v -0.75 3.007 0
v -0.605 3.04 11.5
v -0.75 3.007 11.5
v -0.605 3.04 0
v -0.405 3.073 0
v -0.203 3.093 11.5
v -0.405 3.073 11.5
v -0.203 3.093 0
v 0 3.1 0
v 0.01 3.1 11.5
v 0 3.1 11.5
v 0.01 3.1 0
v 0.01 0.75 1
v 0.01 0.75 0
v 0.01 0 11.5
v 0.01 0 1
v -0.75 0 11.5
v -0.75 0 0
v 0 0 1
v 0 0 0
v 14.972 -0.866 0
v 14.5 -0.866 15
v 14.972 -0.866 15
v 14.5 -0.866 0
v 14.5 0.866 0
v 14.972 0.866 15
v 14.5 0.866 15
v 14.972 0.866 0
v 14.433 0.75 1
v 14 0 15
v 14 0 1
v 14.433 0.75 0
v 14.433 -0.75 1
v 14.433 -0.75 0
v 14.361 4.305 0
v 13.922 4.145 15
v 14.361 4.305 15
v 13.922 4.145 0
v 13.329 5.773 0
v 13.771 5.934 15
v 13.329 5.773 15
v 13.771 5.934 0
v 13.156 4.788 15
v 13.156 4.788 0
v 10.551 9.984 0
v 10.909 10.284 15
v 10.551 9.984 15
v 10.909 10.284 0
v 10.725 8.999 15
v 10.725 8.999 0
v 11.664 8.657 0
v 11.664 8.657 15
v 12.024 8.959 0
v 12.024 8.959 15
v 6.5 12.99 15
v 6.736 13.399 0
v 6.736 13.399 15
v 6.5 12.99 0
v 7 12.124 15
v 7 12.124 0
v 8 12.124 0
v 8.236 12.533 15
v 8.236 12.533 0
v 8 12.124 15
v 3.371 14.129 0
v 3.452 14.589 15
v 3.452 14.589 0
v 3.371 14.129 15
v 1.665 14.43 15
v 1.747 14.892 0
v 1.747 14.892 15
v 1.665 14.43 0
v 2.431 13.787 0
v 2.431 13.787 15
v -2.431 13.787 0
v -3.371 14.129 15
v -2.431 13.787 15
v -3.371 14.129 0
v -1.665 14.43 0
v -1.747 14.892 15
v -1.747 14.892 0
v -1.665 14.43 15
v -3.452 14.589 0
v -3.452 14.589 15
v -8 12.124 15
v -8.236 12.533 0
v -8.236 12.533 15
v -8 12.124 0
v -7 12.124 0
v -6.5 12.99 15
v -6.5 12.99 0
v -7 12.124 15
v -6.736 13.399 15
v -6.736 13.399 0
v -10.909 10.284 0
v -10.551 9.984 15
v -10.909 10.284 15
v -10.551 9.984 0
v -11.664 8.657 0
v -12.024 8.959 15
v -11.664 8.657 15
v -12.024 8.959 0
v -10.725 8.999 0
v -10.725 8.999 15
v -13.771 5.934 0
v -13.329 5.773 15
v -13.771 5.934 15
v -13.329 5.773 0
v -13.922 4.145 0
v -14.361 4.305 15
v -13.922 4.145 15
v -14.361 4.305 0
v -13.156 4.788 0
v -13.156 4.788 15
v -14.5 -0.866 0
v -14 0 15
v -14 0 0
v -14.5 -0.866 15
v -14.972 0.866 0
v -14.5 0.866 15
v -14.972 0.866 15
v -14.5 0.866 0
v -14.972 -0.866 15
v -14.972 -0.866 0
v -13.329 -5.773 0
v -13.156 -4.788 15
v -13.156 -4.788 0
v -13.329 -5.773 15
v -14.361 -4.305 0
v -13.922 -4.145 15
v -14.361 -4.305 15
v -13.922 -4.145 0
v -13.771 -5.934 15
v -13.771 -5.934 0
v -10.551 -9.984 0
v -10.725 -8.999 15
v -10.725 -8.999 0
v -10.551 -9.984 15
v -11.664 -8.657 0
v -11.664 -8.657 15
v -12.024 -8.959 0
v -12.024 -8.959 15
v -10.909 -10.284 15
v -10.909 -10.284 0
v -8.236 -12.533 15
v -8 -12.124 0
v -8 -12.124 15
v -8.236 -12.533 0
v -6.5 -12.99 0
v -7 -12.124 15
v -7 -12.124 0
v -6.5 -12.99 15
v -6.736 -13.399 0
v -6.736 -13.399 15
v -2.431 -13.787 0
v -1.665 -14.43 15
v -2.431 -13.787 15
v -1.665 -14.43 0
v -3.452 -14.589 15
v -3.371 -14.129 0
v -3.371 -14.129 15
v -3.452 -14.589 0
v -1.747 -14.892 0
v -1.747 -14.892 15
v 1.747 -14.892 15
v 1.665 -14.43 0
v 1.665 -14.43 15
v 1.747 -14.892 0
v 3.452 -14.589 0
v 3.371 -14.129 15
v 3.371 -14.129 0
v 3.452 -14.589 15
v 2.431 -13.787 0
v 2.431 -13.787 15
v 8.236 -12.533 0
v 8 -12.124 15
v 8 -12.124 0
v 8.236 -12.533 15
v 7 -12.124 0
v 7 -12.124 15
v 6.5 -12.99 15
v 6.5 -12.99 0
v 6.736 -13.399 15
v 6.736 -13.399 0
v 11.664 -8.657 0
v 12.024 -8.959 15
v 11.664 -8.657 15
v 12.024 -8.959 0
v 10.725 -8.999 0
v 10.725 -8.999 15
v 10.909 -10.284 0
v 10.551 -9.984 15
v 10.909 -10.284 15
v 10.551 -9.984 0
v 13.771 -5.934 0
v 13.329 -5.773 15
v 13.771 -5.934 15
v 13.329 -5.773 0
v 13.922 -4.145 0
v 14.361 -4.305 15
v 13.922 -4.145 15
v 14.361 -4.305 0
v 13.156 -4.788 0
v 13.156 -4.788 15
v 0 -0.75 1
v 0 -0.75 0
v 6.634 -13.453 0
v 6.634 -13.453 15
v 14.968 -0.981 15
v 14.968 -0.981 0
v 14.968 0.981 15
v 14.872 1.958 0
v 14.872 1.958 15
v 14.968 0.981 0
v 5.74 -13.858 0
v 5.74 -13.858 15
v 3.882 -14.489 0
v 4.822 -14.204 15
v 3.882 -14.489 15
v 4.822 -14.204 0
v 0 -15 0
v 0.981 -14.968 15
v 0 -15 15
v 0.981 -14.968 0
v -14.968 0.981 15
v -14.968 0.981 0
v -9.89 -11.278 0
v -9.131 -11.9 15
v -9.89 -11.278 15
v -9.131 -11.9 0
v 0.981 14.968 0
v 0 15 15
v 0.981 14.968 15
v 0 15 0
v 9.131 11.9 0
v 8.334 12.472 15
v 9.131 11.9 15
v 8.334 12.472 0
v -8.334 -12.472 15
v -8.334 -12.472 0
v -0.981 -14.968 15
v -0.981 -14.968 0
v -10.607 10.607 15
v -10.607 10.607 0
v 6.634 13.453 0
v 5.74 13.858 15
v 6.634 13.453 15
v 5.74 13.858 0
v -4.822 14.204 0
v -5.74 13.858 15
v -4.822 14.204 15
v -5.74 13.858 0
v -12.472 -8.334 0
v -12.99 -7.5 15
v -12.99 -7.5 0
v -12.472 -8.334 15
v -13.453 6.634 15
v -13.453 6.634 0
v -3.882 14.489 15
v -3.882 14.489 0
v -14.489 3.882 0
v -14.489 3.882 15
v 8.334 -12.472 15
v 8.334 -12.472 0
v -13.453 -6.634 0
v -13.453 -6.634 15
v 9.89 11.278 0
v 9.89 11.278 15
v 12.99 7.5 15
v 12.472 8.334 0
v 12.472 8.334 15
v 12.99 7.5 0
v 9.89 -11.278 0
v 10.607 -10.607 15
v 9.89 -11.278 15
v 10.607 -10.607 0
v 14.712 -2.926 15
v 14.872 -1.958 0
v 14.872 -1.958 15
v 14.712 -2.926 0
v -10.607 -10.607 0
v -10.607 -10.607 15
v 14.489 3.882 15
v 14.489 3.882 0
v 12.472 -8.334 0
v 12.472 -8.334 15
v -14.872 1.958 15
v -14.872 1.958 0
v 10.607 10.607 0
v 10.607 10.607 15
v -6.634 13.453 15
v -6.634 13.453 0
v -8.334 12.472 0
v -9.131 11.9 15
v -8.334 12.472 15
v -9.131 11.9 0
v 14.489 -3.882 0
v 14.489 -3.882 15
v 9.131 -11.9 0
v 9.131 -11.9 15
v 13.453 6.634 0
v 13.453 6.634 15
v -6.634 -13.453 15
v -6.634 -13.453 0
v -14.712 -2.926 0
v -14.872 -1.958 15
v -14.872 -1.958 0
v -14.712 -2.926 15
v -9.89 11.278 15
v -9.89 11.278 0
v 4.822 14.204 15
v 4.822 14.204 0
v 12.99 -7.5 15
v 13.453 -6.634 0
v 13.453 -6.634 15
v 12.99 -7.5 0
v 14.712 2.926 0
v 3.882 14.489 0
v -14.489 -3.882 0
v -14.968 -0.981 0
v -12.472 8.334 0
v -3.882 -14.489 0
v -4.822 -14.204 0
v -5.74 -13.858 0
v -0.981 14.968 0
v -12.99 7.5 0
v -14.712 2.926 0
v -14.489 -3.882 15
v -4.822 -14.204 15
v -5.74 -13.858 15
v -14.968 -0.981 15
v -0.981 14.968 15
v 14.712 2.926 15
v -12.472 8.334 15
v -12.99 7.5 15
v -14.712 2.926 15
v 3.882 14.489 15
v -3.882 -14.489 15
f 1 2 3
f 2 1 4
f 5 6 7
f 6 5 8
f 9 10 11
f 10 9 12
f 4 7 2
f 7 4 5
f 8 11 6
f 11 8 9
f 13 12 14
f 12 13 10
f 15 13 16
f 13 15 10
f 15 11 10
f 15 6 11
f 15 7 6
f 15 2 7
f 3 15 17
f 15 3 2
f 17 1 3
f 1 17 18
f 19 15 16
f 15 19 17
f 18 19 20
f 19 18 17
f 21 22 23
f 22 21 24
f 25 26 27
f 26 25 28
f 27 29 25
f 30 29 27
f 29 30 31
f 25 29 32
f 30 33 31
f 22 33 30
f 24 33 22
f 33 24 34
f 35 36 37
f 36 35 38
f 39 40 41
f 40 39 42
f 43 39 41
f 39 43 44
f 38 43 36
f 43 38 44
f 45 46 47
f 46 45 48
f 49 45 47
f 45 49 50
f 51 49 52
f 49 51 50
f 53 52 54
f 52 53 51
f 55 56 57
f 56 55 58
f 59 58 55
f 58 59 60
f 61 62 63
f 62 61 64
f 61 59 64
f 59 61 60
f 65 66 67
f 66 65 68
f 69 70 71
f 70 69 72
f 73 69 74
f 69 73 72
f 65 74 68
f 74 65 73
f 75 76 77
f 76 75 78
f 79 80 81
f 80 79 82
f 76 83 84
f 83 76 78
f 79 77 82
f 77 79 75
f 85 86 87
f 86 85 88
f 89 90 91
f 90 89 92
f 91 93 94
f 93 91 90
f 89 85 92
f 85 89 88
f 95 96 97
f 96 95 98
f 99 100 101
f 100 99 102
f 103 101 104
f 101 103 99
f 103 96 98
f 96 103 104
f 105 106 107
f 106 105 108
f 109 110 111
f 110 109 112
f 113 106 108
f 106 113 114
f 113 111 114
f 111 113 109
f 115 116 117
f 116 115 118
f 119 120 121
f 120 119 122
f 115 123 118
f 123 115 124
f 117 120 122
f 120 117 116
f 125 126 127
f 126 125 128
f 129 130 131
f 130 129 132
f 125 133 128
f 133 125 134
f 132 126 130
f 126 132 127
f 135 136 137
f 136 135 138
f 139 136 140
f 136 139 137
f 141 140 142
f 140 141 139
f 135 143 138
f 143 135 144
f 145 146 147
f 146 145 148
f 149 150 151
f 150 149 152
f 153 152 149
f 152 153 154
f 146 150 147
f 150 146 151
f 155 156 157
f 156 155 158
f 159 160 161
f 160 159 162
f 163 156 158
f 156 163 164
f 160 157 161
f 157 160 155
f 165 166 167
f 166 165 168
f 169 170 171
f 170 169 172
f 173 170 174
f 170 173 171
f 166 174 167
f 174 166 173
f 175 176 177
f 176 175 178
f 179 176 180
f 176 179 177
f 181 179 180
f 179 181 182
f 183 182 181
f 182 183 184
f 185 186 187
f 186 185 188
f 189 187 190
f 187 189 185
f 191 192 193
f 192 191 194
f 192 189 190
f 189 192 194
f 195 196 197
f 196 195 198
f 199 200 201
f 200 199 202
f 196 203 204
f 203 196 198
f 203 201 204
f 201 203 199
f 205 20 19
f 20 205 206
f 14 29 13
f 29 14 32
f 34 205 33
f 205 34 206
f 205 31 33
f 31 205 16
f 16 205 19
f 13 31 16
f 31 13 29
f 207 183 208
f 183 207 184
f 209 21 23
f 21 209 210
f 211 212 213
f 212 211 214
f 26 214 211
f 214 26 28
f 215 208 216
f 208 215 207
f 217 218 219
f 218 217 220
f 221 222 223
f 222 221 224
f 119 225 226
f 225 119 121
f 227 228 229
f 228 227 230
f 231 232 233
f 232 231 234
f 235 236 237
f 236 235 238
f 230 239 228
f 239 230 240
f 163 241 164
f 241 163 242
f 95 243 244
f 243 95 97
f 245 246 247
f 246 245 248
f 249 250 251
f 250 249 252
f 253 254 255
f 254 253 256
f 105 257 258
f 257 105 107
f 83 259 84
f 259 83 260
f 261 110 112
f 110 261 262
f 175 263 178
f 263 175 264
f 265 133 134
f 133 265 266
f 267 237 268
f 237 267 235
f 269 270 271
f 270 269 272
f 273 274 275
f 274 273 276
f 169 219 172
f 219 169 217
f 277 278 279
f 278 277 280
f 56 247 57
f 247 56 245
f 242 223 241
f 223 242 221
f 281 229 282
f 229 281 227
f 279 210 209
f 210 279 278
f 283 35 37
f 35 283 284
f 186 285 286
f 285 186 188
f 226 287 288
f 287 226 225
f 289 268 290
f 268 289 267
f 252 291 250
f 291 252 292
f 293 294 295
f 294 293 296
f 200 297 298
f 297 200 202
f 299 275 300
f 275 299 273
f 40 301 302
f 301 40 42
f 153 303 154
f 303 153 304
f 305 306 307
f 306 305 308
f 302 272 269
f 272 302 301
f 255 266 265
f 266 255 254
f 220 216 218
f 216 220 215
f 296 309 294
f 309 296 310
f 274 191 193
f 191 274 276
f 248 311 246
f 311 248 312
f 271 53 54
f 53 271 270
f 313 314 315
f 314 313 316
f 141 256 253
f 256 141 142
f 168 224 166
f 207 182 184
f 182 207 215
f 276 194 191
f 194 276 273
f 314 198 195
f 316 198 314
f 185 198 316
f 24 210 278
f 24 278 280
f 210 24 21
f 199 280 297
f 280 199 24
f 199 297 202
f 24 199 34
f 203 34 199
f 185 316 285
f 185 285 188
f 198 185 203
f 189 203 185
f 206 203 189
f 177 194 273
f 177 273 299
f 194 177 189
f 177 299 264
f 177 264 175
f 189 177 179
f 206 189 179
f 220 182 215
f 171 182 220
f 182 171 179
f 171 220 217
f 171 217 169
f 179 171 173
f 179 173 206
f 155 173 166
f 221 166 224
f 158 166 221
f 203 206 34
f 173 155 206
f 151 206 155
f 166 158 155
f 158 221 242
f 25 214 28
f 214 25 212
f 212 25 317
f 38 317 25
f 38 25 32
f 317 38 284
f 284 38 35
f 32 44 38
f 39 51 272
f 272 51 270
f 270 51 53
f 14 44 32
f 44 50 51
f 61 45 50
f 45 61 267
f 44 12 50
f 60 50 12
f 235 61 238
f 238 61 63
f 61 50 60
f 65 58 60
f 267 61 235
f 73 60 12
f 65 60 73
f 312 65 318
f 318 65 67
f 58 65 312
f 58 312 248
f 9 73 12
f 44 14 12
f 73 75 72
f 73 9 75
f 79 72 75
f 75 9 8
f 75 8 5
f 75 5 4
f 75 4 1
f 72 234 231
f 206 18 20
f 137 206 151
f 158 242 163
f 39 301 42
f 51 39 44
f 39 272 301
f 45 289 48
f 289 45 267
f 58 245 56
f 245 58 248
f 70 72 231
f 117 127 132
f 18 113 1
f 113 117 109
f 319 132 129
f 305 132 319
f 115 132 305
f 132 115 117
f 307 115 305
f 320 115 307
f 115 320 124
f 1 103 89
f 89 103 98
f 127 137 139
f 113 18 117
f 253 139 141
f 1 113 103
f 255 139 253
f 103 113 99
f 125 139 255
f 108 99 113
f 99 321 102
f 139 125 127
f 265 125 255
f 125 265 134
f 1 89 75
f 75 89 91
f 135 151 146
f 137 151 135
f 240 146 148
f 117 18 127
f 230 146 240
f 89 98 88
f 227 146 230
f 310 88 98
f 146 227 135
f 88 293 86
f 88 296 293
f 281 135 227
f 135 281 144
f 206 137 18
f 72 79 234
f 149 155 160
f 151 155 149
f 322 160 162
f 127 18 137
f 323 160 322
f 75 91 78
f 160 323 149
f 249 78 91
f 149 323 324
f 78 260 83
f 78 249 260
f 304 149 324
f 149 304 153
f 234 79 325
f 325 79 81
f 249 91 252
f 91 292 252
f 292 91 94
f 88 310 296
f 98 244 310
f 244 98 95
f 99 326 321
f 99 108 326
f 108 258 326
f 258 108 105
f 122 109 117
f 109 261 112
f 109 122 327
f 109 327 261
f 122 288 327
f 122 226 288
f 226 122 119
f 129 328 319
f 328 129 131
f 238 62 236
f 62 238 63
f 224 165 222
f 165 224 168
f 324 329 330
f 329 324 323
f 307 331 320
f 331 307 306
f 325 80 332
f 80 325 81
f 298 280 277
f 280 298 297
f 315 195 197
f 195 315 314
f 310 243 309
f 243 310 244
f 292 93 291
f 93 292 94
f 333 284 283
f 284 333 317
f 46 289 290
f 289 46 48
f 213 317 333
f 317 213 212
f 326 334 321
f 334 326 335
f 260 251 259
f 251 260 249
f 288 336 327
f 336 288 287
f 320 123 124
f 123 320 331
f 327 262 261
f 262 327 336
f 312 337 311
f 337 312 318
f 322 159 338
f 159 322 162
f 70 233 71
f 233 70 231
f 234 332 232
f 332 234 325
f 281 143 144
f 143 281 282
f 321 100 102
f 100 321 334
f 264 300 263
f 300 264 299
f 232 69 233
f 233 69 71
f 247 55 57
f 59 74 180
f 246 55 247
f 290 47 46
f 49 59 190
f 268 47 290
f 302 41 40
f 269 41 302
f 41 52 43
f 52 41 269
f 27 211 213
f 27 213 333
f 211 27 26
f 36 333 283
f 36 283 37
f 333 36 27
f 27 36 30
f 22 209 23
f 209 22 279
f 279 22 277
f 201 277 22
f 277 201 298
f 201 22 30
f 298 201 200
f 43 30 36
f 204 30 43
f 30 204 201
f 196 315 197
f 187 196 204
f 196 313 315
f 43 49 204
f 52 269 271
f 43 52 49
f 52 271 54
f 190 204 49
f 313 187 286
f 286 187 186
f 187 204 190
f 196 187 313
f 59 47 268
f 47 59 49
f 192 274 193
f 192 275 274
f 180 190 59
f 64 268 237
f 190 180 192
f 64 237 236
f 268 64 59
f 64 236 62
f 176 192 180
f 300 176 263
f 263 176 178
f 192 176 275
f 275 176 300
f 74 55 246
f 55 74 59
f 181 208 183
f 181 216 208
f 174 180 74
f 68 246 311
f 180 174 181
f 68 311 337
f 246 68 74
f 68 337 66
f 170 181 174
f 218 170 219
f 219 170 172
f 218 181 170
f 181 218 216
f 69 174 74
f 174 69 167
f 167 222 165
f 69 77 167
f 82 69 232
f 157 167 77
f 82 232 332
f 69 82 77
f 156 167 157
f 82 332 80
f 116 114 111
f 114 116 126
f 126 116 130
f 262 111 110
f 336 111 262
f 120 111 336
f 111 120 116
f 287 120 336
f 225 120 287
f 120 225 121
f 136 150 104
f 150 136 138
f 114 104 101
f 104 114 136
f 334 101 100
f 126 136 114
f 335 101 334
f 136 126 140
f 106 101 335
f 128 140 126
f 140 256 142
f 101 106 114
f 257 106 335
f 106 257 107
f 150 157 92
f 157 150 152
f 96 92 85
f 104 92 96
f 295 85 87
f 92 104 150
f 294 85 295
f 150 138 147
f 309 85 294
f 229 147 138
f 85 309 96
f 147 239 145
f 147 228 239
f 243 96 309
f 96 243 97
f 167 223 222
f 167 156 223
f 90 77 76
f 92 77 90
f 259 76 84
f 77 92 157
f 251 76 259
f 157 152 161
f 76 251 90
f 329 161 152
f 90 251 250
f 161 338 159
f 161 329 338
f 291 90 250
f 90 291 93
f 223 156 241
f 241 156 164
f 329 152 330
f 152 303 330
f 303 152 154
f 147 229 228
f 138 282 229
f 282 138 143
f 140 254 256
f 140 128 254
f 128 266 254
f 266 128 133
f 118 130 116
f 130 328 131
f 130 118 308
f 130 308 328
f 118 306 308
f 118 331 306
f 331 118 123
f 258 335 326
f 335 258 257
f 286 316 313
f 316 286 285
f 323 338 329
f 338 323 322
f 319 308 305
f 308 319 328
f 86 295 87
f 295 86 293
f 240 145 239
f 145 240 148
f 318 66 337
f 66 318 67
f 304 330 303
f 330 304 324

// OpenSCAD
// Hotplate stirrer knob for a 6 mm D-shaft
// Print orientation: bottom face (with D-bore) on the bed at z = 0

$fn = 96;

// ---- Dimensions (mm) ----
knob_d        = 30;    // knob diameter
knob_h        = 15;    // knob height
shaft_d       = 6;     // D-shaft diameter
bore_d        = 6.2;   // D-bore circle diameter
bore_depth    = 12;    // D-bore depth from bottom face
bore_flat     = (bore_d - 4.7) / 2;  // offset of flat from circle centre (1.95)
groove_d      = 2;     // grip groove diameter
groove_count  = 18;    // number of grip grooves
pointer_w     = 1.5;   // pointer groove width
pointer_d     = 1;     // pointer groove depth
eps           = 0.5;   // overshoot for clean cuts

// ---- Model ----
difference() {
    // Main cylinder
    translate([0, 0, 0])
        cylinder(d = knob_d, h = knob_h);

    // D-shaped blind bore
    translate([0, 0, -eps])
        intersection() {
            cylinder(d = bore_d, h = bore_depth + eps);
            translate([-bore_flat, 0, -eps])
                cube([bore_flat + 0.01, bore_d + 2 * bore_flat, bore_depth + eps]);
        };

    // Vertical grip grooves around the outside
    for (i = [0 : groove_count - 1]) {
        rotate([0, 0, i * 360 / groove_count])
            translate([knob_d / 2, 0, -eps])
                cylinder(d = groove_d, h = knob_h + 2 * eps, $fn = 6);
    }

    // Pointer groove from centre to outer edge
    translate([0, 0, -eps])
        intersection() {
            translate([0, -pointer_w / 2, -eps])
                cube([knob_d / 2 + eps, pointer_w, knob_h + 2 * eps]);
            cylinder(d = knob_d, h = pointer_d + eps);
        };
}
